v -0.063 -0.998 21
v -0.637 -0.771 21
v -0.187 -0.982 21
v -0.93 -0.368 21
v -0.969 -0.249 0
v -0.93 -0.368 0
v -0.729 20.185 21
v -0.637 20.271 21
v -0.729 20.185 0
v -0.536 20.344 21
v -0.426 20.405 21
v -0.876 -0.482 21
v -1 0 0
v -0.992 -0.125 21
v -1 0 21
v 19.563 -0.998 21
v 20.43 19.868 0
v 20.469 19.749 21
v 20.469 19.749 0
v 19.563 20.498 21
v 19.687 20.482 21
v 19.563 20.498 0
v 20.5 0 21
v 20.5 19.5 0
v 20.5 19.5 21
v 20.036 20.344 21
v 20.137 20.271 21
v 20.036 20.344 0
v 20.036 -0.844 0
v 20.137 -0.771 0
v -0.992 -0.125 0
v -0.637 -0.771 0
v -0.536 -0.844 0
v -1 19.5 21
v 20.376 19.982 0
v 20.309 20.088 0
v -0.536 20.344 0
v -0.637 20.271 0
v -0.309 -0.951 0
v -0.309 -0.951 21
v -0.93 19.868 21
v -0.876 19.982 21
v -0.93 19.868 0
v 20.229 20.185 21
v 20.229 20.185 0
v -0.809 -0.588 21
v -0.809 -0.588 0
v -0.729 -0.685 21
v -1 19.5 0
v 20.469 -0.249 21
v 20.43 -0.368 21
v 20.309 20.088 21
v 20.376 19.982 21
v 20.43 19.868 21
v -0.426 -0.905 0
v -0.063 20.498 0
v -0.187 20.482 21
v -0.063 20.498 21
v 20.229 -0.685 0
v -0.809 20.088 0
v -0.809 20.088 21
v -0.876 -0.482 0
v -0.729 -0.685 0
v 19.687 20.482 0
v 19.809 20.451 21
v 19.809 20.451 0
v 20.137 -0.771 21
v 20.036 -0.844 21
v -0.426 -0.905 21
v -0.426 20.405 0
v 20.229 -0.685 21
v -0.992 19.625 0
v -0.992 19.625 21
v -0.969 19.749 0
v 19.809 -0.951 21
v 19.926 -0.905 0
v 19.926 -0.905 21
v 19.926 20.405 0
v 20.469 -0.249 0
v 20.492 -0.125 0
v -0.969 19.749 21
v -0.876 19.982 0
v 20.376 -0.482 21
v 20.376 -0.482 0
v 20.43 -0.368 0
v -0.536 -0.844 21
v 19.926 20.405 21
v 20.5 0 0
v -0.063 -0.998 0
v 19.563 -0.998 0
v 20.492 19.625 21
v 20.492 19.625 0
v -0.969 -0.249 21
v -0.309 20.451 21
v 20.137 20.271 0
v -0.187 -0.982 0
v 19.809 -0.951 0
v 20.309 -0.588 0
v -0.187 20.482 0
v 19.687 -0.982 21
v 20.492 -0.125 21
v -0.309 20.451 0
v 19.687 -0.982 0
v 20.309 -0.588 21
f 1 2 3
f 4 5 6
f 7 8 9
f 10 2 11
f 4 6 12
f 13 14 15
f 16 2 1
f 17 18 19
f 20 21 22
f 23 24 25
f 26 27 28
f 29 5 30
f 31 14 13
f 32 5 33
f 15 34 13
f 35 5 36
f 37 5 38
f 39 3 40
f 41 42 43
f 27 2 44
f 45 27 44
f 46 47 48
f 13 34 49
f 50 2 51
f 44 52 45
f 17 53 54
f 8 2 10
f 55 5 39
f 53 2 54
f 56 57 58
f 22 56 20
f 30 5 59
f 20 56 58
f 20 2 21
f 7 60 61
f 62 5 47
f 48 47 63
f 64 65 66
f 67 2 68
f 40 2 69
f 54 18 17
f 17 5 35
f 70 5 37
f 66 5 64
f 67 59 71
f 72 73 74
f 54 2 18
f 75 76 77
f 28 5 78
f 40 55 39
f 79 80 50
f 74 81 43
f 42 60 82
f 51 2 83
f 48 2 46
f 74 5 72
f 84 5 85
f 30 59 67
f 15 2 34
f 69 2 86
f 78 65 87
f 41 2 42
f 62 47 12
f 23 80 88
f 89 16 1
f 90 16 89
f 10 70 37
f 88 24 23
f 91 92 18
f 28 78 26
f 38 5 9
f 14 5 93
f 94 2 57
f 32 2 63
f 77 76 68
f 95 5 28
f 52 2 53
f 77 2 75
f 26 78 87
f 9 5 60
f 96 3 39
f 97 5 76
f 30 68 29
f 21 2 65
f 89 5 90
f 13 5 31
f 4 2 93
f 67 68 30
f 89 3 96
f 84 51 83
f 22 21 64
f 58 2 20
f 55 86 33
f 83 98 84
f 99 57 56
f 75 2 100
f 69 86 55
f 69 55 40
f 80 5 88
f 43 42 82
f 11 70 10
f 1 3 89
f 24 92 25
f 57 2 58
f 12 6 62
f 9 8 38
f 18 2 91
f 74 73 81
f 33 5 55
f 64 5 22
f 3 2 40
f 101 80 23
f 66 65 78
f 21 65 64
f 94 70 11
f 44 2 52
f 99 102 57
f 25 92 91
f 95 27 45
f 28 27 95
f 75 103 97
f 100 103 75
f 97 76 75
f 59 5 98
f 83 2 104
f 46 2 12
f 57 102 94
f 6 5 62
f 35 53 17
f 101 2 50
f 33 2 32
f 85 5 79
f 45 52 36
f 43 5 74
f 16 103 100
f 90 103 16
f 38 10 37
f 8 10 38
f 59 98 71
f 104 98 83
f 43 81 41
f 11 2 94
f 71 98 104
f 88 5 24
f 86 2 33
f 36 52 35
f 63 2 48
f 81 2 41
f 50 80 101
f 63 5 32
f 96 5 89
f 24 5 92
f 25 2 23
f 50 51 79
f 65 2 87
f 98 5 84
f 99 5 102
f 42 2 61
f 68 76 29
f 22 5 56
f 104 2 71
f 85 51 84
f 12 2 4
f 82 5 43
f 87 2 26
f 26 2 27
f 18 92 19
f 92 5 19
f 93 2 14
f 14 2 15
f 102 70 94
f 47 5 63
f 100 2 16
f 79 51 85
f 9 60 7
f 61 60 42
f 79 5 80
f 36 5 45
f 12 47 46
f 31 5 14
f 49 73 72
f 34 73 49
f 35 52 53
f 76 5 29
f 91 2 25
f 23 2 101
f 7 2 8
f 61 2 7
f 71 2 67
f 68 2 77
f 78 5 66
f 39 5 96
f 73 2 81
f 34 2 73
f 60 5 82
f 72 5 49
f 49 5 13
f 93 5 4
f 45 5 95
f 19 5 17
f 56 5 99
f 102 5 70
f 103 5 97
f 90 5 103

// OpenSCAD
// miniround([20,20,20],1);
miniround([20,20,20],1);

module miniround(size, radius)
{
$fn=50;
x = size[0]-radius/2;
y = size[1]-radius/2;
// echo (size=size, x=x, y=x, radius=radius)

minkowski()
{
    cube(size=[x,y,size[2]]);
    cylinder(r=radius);
    // Using a sphere is possible, but will kill performance
    //sphere(r=radius);
}
}
